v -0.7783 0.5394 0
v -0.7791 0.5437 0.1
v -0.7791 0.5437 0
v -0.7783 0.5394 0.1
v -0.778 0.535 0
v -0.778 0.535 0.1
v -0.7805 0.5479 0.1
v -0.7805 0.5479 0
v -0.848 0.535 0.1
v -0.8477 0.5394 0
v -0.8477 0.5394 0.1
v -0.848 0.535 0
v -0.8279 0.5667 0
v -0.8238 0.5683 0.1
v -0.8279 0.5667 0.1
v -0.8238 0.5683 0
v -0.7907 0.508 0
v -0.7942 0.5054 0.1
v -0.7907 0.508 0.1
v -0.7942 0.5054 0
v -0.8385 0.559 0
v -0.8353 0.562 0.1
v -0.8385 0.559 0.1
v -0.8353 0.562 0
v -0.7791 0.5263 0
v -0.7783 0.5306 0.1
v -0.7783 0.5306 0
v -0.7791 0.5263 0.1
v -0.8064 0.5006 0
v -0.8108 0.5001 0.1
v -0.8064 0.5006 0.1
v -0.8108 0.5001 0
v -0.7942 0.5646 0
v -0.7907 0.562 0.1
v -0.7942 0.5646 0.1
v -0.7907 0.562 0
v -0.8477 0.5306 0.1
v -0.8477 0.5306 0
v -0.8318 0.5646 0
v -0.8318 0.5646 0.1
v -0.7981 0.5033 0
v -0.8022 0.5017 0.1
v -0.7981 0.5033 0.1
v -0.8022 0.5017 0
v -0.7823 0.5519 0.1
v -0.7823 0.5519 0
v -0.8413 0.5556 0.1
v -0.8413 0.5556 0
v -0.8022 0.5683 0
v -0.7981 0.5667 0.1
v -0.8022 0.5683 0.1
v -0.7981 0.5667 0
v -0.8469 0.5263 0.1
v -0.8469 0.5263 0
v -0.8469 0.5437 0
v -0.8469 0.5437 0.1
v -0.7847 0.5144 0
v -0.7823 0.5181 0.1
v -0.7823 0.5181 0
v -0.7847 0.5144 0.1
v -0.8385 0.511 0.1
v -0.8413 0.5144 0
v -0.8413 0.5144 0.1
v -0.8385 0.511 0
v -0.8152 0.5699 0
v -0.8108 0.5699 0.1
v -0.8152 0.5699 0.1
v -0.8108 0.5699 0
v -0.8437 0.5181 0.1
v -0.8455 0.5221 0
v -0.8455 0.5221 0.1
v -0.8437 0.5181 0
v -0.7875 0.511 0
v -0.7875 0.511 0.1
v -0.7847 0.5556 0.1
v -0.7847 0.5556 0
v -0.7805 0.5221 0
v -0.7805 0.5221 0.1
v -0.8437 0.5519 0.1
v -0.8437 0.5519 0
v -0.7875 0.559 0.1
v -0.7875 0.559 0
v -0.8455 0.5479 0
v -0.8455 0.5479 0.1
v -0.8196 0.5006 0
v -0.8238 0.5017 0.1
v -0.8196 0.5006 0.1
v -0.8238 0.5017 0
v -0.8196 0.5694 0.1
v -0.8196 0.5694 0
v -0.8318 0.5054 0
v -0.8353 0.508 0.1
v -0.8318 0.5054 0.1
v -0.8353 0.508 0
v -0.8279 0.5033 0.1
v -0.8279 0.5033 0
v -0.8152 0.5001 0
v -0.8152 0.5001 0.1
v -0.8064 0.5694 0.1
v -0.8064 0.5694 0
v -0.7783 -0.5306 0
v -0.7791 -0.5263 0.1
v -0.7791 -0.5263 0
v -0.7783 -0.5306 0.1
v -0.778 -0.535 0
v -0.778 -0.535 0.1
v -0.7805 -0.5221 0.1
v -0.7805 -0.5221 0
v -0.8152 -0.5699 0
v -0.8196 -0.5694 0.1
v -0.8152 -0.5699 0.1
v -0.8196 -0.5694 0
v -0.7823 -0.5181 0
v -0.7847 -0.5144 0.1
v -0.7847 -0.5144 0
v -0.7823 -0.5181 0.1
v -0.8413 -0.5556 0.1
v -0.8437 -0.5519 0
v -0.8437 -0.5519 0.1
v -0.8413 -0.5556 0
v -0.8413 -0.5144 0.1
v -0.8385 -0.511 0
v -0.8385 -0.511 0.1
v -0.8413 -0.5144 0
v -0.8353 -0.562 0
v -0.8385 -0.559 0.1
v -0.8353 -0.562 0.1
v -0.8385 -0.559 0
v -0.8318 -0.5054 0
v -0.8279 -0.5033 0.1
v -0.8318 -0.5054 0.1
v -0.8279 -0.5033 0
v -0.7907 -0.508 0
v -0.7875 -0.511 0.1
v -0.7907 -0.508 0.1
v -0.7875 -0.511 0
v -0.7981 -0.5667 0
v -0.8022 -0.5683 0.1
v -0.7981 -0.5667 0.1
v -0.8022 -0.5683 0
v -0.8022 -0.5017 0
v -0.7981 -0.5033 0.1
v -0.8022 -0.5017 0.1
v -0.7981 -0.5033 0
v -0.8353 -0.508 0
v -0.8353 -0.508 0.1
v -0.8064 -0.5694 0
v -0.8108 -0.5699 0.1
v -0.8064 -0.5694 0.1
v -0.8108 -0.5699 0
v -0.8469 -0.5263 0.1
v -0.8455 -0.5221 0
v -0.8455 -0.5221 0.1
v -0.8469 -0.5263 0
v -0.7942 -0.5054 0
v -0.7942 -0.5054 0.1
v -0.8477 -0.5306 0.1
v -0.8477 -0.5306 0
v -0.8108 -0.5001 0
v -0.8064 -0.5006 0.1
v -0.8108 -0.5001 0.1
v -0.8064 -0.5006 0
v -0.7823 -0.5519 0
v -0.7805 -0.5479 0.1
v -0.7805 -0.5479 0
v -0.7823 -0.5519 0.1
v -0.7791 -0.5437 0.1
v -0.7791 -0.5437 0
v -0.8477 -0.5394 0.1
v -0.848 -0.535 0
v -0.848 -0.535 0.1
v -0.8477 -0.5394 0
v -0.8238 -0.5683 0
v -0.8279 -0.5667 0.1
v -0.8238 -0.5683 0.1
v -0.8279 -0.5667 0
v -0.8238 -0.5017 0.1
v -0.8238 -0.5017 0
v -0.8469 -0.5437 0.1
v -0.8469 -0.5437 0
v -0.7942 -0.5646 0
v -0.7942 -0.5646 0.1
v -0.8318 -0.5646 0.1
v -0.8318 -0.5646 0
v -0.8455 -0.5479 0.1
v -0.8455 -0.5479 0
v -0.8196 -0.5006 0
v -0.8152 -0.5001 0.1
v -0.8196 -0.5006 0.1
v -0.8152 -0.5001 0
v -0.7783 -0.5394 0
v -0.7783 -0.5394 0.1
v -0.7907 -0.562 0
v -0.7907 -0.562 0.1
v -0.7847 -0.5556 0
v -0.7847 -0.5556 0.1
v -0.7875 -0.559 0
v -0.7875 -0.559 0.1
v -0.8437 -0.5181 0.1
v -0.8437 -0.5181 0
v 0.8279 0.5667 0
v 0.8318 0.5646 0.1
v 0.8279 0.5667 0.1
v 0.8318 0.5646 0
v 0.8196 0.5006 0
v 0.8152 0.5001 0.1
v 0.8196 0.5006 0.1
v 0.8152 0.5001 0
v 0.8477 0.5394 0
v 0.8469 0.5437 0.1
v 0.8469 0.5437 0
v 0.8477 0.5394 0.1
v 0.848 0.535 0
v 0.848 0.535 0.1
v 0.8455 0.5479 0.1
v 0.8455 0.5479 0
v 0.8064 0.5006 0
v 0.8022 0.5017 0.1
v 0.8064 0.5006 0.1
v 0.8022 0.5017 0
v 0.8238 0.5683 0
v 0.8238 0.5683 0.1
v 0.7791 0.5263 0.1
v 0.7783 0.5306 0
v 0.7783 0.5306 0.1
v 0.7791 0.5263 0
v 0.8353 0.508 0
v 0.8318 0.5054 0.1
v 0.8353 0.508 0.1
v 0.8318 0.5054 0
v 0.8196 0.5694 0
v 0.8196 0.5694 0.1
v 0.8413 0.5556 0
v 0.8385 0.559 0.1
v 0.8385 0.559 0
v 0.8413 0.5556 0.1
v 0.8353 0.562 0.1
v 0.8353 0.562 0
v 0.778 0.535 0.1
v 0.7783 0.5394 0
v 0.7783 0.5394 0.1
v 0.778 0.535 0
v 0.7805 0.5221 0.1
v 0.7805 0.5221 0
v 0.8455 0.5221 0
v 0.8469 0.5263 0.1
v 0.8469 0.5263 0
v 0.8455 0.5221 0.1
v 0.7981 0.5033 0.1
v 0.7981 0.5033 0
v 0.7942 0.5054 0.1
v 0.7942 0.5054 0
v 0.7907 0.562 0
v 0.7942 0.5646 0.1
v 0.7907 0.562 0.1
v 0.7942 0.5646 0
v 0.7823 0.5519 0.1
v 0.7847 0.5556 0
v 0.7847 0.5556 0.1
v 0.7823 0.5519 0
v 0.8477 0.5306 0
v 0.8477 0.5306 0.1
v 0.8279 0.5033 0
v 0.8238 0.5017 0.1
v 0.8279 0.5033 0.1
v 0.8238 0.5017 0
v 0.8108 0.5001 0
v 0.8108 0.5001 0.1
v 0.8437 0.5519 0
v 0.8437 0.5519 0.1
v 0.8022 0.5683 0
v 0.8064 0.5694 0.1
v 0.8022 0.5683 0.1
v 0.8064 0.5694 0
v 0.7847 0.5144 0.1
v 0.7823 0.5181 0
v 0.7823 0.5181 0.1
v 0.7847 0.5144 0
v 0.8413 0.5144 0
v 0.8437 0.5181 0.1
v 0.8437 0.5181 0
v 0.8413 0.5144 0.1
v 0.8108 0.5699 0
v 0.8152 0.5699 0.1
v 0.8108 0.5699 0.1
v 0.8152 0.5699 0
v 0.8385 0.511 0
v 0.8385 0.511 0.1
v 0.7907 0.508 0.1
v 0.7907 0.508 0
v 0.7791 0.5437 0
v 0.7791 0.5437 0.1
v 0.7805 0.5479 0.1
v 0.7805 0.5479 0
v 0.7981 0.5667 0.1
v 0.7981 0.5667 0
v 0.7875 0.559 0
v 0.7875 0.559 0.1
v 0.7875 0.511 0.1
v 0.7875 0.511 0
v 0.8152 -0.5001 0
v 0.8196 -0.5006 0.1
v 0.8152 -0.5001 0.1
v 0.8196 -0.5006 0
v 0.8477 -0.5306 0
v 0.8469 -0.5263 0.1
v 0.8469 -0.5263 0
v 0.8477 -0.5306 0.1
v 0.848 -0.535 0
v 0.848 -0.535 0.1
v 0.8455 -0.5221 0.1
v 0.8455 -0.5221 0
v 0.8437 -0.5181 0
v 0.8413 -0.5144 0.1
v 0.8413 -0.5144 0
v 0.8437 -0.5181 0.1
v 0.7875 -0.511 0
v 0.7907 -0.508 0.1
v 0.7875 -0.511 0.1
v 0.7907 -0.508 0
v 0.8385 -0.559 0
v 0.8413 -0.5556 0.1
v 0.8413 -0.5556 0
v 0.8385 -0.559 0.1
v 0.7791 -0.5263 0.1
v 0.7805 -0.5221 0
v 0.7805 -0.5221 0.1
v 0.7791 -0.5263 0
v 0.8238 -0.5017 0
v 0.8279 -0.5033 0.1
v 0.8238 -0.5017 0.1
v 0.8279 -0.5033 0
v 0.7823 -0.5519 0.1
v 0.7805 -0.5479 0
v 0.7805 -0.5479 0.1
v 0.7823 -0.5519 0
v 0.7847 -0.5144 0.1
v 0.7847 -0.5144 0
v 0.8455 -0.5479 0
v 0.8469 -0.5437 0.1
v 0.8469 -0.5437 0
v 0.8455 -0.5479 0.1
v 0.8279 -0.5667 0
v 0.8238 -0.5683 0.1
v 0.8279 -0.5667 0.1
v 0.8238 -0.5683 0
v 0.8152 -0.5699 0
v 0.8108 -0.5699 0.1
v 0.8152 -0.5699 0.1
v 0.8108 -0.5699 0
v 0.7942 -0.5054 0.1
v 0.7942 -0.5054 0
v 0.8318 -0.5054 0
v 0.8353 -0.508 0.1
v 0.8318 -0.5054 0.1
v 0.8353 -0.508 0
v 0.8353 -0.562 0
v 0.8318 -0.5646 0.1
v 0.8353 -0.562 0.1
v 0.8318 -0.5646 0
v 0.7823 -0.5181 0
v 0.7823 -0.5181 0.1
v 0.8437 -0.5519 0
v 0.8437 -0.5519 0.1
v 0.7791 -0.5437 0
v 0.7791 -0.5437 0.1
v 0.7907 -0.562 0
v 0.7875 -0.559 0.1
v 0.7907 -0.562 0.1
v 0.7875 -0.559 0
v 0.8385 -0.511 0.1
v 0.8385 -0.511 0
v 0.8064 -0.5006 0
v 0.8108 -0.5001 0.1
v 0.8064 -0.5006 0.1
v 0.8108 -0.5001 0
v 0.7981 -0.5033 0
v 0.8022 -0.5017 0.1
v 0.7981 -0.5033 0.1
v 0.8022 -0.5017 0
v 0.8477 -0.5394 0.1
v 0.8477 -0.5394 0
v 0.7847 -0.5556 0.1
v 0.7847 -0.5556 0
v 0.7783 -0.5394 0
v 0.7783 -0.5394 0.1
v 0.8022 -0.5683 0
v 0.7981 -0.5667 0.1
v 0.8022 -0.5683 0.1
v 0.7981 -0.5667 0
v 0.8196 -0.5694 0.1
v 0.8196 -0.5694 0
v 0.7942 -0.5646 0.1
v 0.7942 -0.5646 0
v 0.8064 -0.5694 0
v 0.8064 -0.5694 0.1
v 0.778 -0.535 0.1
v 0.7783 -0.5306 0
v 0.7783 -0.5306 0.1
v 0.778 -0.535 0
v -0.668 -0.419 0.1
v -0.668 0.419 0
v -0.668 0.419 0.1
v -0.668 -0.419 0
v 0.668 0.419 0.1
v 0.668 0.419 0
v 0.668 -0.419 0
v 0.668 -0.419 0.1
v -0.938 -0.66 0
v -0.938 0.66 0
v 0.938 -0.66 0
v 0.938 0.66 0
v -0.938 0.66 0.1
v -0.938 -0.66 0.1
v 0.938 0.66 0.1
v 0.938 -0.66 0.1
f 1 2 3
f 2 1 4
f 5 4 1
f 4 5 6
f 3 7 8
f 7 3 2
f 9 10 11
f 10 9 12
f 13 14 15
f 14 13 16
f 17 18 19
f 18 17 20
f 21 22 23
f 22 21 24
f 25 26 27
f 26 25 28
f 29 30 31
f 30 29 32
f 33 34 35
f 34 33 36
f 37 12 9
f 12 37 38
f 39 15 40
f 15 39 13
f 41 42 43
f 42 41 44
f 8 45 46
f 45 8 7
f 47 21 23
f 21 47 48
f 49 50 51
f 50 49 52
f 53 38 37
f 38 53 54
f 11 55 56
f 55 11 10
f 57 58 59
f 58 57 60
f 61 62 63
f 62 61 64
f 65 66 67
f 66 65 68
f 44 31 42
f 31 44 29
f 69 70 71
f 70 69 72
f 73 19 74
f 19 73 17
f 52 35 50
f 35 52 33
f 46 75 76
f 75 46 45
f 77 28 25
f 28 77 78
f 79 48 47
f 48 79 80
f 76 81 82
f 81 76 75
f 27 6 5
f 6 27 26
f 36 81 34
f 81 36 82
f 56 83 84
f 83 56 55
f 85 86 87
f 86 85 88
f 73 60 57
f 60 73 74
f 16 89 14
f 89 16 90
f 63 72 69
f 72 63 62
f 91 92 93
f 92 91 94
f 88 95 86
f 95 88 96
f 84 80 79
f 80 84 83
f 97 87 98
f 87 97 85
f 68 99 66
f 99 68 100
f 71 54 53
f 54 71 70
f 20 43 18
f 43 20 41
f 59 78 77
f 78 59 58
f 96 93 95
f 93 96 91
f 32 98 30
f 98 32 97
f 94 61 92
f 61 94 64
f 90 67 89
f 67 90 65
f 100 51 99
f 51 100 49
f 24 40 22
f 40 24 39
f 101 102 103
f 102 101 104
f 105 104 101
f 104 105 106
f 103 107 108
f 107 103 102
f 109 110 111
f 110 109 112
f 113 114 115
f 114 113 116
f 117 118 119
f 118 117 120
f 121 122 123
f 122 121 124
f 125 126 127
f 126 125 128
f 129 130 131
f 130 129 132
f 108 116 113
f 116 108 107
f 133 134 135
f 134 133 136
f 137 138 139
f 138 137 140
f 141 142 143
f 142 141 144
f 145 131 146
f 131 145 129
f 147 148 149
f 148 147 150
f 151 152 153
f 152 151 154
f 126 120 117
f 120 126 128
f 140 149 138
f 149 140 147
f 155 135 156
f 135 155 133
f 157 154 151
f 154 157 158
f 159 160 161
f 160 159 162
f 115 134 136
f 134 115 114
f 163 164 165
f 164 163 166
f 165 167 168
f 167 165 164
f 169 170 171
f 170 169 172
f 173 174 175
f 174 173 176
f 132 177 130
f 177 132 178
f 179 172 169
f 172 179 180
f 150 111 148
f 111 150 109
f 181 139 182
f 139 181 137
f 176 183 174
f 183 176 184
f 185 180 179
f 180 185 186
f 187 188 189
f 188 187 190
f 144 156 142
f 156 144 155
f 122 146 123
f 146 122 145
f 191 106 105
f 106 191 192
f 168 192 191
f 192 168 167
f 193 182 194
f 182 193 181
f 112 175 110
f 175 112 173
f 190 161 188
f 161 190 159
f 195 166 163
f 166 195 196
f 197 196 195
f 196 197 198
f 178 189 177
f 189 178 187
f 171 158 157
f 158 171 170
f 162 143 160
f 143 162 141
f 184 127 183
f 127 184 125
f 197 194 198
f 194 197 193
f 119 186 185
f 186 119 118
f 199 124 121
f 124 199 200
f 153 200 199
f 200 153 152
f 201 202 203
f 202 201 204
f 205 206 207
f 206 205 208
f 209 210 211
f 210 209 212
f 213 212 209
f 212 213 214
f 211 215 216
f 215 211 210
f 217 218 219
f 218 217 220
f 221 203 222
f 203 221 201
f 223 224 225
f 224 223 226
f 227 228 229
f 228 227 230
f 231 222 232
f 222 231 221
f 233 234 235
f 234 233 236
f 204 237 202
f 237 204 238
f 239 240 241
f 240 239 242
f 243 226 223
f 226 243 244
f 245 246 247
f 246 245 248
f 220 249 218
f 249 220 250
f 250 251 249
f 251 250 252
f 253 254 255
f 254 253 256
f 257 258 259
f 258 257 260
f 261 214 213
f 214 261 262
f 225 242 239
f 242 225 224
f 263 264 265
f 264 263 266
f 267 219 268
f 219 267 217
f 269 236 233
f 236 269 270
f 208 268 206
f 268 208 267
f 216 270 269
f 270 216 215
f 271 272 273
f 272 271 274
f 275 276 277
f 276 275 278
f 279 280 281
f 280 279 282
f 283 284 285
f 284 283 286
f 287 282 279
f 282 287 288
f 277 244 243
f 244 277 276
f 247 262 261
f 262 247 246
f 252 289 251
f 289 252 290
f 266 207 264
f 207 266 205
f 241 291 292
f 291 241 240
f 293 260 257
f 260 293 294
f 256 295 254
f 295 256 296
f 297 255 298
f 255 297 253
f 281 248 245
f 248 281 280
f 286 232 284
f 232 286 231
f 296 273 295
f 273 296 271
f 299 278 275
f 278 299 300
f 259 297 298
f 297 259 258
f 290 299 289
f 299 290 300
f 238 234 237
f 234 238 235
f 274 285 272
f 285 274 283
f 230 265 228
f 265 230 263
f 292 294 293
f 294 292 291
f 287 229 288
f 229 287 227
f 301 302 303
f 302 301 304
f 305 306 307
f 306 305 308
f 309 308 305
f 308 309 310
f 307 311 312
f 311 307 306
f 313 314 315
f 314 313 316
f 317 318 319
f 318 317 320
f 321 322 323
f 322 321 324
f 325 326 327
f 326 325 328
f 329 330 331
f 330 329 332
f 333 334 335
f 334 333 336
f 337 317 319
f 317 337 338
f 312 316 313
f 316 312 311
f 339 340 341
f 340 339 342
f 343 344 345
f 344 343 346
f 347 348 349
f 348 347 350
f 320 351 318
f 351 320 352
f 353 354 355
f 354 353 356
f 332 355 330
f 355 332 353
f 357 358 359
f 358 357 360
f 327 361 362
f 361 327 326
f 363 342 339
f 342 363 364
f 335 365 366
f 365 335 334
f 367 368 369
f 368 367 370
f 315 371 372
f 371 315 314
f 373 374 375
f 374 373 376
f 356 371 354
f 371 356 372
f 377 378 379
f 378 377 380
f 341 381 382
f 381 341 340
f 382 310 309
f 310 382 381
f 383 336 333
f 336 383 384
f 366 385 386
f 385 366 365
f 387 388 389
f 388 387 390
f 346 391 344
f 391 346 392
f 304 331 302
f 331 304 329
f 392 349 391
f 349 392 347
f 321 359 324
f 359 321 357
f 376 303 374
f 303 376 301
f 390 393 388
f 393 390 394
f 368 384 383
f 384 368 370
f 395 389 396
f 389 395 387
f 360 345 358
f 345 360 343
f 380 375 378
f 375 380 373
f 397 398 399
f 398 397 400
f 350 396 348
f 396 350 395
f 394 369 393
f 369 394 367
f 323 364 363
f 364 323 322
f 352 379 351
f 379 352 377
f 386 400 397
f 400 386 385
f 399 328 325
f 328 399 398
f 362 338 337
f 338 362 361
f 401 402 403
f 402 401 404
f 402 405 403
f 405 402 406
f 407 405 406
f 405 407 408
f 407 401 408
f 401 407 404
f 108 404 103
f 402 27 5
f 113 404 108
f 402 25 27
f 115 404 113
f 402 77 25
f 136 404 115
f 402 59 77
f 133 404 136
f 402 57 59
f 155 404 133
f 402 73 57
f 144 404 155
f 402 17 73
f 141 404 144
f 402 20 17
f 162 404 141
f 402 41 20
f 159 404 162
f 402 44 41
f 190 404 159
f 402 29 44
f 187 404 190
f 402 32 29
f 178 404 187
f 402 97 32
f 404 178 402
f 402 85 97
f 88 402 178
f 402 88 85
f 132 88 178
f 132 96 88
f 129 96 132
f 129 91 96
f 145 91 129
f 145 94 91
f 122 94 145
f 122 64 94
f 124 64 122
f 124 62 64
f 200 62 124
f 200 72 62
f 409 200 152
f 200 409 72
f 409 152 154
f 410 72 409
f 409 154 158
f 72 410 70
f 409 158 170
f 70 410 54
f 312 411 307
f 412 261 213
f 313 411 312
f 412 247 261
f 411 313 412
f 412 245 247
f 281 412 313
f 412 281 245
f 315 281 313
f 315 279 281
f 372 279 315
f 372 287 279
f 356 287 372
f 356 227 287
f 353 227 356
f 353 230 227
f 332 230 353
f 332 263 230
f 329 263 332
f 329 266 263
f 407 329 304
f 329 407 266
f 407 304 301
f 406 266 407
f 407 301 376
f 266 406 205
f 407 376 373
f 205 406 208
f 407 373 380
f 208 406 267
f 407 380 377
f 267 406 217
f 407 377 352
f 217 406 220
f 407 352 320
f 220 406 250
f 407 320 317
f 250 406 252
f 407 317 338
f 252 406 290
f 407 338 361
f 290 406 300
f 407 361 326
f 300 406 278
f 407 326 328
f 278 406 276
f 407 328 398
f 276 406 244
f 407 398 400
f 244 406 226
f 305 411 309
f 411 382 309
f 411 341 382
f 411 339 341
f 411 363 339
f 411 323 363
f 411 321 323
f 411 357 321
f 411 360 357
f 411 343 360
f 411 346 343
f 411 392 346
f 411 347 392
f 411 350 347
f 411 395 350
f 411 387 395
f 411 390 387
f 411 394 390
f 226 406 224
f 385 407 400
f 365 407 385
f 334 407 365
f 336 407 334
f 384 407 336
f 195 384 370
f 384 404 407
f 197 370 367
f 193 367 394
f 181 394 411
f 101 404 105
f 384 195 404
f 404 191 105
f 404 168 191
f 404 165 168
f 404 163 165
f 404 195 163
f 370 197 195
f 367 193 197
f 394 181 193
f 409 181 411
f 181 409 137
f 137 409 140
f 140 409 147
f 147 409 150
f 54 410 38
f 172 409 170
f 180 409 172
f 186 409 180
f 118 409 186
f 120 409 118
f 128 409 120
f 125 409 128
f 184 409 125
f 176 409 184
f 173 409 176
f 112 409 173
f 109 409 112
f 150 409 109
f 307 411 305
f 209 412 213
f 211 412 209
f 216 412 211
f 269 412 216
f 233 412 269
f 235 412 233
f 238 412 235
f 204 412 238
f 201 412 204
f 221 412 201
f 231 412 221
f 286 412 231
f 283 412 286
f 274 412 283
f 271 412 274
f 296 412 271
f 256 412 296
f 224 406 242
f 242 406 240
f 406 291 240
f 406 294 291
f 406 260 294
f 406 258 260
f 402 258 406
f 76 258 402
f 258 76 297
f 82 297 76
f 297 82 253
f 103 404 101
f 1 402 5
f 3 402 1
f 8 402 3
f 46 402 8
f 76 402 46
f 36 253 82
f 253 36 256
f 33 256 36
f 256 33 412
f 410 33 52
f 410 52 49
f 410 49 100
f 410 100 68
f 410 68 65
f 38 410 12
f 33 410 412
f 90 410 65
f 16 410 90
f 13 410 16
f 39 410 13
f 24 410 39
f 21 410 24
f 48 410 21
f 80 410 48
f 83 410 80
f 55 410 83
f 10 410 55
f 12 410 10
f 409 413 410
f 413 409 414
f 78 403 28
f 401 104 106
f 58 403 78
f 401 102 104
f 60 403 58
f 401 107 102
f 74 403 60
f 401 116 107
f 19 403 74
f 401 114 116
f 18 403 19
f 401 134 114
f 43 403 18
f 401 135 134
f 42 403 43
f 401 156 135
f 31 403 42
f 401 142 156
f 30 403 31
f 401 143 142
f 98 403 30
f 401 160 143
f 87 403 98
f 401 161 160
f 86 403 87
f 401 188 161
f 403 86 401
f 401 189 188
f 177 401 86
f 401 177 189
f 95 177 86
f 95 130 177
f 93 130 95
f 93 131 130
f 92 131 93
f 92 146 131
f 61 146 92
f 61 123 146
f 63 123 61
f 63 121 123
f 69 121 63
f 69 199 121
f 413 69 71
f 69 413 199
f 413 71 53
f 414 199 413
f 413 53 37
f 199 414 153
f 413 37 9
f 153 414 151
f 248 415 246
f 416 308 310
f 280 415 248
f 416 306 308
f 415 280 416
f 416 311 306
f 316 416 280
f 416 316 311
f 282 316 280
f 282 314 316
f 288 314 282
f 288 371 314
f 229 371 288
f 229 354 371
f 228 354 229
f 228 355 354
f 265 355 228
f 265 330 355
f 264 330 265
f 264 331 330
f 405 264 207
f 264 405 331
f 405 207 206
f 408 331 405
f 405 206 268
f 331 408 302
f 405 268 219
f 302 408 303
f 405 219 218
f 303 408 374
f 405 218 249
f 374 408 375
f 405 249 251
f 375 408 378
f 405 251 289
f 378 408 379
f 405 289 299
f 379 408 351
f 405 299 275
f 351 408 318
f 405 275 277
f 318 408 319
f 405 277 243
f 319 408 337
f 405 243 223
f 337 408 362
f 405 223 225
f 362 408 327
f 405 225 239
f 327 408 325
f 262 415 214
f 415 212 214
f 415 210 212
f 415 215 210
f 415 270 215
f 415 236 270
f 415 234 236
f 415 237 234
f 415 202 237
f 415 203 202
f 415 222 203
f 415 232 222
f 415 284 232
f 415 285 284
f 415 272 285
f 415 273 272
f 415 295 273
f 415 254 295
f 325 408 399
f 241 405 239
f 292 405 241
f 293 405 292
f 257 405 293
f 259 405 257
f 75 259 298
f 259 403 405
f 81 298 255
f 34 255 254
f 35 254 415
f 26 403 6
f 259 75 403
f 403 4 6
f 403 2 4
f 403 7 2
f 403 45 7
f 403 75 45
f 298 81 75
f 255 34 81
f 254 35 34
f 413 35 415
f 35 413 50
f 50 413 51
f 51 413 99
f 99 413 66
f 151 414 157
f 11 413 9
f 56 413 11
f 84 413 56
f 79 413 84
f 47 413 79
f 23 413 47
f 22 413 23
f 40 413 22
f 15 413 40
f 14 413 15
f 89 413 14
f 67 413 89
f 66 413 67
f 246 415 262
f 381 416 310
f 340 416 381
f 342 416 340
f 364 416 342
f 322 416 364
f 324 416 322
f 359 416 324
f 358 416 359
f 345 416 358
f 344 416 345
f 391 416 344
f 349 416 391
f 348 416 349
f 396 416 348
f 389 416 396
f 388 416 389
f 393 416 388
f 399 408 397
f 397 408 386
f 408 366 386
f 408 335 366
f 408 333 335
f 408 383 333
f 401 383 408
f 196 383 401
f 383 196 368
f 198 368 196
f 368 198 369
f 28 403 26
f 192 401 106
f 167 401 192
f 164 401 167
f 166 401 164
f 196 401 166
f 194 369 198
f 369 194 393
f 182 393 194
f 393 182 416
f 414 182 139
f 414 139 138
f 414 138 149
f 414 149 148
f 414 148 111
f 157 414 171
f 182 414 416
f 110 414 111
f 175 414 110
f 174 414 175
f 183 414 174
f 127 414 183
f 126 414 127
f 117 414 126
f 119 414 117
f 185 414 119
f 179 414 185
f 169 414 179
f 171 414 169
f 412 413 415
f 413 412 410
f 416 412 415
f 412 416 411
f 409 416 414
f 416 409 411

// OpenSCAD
// adapter plate for panel ammeter

2_56 = .07; // drill tap diameter
T_PLATE = .1;

MOUNT_X = 1.626;
MOUNT_Y = 1.07;

module hole(x, y, height, d) {
    translate([x, y, height/2])
        cylinder(h=2 * height,d=d,center=true,$fn=50);
}



difference() {
    linear_extrude(height = T_PLATE)
        square([MOUNT_X + .25, MOUNT_Y + .25], center = true);
    union() {
        
        // mounting holes for agc
        hole(-MOUNT_X/2, +MOUNT_Y/2, T_PLATE, 2_56);
        hole(-MOUNT_X/2, -MOUNT_Y/2, T_PLATE, 2_56);
        hole(+MOUNT_X/2, +MOUNT_Y/2, T_PLATE, 2_56);
        hole(+MOUNT_X/2, -MOUNT_Y/2, T_PLATE, 2_56);

        
        // cutout unused space in middle
        translate([0,0,-.5])
            linear_extrude(height = 1)
                square([1.336, .838], center = true);

        };
}
